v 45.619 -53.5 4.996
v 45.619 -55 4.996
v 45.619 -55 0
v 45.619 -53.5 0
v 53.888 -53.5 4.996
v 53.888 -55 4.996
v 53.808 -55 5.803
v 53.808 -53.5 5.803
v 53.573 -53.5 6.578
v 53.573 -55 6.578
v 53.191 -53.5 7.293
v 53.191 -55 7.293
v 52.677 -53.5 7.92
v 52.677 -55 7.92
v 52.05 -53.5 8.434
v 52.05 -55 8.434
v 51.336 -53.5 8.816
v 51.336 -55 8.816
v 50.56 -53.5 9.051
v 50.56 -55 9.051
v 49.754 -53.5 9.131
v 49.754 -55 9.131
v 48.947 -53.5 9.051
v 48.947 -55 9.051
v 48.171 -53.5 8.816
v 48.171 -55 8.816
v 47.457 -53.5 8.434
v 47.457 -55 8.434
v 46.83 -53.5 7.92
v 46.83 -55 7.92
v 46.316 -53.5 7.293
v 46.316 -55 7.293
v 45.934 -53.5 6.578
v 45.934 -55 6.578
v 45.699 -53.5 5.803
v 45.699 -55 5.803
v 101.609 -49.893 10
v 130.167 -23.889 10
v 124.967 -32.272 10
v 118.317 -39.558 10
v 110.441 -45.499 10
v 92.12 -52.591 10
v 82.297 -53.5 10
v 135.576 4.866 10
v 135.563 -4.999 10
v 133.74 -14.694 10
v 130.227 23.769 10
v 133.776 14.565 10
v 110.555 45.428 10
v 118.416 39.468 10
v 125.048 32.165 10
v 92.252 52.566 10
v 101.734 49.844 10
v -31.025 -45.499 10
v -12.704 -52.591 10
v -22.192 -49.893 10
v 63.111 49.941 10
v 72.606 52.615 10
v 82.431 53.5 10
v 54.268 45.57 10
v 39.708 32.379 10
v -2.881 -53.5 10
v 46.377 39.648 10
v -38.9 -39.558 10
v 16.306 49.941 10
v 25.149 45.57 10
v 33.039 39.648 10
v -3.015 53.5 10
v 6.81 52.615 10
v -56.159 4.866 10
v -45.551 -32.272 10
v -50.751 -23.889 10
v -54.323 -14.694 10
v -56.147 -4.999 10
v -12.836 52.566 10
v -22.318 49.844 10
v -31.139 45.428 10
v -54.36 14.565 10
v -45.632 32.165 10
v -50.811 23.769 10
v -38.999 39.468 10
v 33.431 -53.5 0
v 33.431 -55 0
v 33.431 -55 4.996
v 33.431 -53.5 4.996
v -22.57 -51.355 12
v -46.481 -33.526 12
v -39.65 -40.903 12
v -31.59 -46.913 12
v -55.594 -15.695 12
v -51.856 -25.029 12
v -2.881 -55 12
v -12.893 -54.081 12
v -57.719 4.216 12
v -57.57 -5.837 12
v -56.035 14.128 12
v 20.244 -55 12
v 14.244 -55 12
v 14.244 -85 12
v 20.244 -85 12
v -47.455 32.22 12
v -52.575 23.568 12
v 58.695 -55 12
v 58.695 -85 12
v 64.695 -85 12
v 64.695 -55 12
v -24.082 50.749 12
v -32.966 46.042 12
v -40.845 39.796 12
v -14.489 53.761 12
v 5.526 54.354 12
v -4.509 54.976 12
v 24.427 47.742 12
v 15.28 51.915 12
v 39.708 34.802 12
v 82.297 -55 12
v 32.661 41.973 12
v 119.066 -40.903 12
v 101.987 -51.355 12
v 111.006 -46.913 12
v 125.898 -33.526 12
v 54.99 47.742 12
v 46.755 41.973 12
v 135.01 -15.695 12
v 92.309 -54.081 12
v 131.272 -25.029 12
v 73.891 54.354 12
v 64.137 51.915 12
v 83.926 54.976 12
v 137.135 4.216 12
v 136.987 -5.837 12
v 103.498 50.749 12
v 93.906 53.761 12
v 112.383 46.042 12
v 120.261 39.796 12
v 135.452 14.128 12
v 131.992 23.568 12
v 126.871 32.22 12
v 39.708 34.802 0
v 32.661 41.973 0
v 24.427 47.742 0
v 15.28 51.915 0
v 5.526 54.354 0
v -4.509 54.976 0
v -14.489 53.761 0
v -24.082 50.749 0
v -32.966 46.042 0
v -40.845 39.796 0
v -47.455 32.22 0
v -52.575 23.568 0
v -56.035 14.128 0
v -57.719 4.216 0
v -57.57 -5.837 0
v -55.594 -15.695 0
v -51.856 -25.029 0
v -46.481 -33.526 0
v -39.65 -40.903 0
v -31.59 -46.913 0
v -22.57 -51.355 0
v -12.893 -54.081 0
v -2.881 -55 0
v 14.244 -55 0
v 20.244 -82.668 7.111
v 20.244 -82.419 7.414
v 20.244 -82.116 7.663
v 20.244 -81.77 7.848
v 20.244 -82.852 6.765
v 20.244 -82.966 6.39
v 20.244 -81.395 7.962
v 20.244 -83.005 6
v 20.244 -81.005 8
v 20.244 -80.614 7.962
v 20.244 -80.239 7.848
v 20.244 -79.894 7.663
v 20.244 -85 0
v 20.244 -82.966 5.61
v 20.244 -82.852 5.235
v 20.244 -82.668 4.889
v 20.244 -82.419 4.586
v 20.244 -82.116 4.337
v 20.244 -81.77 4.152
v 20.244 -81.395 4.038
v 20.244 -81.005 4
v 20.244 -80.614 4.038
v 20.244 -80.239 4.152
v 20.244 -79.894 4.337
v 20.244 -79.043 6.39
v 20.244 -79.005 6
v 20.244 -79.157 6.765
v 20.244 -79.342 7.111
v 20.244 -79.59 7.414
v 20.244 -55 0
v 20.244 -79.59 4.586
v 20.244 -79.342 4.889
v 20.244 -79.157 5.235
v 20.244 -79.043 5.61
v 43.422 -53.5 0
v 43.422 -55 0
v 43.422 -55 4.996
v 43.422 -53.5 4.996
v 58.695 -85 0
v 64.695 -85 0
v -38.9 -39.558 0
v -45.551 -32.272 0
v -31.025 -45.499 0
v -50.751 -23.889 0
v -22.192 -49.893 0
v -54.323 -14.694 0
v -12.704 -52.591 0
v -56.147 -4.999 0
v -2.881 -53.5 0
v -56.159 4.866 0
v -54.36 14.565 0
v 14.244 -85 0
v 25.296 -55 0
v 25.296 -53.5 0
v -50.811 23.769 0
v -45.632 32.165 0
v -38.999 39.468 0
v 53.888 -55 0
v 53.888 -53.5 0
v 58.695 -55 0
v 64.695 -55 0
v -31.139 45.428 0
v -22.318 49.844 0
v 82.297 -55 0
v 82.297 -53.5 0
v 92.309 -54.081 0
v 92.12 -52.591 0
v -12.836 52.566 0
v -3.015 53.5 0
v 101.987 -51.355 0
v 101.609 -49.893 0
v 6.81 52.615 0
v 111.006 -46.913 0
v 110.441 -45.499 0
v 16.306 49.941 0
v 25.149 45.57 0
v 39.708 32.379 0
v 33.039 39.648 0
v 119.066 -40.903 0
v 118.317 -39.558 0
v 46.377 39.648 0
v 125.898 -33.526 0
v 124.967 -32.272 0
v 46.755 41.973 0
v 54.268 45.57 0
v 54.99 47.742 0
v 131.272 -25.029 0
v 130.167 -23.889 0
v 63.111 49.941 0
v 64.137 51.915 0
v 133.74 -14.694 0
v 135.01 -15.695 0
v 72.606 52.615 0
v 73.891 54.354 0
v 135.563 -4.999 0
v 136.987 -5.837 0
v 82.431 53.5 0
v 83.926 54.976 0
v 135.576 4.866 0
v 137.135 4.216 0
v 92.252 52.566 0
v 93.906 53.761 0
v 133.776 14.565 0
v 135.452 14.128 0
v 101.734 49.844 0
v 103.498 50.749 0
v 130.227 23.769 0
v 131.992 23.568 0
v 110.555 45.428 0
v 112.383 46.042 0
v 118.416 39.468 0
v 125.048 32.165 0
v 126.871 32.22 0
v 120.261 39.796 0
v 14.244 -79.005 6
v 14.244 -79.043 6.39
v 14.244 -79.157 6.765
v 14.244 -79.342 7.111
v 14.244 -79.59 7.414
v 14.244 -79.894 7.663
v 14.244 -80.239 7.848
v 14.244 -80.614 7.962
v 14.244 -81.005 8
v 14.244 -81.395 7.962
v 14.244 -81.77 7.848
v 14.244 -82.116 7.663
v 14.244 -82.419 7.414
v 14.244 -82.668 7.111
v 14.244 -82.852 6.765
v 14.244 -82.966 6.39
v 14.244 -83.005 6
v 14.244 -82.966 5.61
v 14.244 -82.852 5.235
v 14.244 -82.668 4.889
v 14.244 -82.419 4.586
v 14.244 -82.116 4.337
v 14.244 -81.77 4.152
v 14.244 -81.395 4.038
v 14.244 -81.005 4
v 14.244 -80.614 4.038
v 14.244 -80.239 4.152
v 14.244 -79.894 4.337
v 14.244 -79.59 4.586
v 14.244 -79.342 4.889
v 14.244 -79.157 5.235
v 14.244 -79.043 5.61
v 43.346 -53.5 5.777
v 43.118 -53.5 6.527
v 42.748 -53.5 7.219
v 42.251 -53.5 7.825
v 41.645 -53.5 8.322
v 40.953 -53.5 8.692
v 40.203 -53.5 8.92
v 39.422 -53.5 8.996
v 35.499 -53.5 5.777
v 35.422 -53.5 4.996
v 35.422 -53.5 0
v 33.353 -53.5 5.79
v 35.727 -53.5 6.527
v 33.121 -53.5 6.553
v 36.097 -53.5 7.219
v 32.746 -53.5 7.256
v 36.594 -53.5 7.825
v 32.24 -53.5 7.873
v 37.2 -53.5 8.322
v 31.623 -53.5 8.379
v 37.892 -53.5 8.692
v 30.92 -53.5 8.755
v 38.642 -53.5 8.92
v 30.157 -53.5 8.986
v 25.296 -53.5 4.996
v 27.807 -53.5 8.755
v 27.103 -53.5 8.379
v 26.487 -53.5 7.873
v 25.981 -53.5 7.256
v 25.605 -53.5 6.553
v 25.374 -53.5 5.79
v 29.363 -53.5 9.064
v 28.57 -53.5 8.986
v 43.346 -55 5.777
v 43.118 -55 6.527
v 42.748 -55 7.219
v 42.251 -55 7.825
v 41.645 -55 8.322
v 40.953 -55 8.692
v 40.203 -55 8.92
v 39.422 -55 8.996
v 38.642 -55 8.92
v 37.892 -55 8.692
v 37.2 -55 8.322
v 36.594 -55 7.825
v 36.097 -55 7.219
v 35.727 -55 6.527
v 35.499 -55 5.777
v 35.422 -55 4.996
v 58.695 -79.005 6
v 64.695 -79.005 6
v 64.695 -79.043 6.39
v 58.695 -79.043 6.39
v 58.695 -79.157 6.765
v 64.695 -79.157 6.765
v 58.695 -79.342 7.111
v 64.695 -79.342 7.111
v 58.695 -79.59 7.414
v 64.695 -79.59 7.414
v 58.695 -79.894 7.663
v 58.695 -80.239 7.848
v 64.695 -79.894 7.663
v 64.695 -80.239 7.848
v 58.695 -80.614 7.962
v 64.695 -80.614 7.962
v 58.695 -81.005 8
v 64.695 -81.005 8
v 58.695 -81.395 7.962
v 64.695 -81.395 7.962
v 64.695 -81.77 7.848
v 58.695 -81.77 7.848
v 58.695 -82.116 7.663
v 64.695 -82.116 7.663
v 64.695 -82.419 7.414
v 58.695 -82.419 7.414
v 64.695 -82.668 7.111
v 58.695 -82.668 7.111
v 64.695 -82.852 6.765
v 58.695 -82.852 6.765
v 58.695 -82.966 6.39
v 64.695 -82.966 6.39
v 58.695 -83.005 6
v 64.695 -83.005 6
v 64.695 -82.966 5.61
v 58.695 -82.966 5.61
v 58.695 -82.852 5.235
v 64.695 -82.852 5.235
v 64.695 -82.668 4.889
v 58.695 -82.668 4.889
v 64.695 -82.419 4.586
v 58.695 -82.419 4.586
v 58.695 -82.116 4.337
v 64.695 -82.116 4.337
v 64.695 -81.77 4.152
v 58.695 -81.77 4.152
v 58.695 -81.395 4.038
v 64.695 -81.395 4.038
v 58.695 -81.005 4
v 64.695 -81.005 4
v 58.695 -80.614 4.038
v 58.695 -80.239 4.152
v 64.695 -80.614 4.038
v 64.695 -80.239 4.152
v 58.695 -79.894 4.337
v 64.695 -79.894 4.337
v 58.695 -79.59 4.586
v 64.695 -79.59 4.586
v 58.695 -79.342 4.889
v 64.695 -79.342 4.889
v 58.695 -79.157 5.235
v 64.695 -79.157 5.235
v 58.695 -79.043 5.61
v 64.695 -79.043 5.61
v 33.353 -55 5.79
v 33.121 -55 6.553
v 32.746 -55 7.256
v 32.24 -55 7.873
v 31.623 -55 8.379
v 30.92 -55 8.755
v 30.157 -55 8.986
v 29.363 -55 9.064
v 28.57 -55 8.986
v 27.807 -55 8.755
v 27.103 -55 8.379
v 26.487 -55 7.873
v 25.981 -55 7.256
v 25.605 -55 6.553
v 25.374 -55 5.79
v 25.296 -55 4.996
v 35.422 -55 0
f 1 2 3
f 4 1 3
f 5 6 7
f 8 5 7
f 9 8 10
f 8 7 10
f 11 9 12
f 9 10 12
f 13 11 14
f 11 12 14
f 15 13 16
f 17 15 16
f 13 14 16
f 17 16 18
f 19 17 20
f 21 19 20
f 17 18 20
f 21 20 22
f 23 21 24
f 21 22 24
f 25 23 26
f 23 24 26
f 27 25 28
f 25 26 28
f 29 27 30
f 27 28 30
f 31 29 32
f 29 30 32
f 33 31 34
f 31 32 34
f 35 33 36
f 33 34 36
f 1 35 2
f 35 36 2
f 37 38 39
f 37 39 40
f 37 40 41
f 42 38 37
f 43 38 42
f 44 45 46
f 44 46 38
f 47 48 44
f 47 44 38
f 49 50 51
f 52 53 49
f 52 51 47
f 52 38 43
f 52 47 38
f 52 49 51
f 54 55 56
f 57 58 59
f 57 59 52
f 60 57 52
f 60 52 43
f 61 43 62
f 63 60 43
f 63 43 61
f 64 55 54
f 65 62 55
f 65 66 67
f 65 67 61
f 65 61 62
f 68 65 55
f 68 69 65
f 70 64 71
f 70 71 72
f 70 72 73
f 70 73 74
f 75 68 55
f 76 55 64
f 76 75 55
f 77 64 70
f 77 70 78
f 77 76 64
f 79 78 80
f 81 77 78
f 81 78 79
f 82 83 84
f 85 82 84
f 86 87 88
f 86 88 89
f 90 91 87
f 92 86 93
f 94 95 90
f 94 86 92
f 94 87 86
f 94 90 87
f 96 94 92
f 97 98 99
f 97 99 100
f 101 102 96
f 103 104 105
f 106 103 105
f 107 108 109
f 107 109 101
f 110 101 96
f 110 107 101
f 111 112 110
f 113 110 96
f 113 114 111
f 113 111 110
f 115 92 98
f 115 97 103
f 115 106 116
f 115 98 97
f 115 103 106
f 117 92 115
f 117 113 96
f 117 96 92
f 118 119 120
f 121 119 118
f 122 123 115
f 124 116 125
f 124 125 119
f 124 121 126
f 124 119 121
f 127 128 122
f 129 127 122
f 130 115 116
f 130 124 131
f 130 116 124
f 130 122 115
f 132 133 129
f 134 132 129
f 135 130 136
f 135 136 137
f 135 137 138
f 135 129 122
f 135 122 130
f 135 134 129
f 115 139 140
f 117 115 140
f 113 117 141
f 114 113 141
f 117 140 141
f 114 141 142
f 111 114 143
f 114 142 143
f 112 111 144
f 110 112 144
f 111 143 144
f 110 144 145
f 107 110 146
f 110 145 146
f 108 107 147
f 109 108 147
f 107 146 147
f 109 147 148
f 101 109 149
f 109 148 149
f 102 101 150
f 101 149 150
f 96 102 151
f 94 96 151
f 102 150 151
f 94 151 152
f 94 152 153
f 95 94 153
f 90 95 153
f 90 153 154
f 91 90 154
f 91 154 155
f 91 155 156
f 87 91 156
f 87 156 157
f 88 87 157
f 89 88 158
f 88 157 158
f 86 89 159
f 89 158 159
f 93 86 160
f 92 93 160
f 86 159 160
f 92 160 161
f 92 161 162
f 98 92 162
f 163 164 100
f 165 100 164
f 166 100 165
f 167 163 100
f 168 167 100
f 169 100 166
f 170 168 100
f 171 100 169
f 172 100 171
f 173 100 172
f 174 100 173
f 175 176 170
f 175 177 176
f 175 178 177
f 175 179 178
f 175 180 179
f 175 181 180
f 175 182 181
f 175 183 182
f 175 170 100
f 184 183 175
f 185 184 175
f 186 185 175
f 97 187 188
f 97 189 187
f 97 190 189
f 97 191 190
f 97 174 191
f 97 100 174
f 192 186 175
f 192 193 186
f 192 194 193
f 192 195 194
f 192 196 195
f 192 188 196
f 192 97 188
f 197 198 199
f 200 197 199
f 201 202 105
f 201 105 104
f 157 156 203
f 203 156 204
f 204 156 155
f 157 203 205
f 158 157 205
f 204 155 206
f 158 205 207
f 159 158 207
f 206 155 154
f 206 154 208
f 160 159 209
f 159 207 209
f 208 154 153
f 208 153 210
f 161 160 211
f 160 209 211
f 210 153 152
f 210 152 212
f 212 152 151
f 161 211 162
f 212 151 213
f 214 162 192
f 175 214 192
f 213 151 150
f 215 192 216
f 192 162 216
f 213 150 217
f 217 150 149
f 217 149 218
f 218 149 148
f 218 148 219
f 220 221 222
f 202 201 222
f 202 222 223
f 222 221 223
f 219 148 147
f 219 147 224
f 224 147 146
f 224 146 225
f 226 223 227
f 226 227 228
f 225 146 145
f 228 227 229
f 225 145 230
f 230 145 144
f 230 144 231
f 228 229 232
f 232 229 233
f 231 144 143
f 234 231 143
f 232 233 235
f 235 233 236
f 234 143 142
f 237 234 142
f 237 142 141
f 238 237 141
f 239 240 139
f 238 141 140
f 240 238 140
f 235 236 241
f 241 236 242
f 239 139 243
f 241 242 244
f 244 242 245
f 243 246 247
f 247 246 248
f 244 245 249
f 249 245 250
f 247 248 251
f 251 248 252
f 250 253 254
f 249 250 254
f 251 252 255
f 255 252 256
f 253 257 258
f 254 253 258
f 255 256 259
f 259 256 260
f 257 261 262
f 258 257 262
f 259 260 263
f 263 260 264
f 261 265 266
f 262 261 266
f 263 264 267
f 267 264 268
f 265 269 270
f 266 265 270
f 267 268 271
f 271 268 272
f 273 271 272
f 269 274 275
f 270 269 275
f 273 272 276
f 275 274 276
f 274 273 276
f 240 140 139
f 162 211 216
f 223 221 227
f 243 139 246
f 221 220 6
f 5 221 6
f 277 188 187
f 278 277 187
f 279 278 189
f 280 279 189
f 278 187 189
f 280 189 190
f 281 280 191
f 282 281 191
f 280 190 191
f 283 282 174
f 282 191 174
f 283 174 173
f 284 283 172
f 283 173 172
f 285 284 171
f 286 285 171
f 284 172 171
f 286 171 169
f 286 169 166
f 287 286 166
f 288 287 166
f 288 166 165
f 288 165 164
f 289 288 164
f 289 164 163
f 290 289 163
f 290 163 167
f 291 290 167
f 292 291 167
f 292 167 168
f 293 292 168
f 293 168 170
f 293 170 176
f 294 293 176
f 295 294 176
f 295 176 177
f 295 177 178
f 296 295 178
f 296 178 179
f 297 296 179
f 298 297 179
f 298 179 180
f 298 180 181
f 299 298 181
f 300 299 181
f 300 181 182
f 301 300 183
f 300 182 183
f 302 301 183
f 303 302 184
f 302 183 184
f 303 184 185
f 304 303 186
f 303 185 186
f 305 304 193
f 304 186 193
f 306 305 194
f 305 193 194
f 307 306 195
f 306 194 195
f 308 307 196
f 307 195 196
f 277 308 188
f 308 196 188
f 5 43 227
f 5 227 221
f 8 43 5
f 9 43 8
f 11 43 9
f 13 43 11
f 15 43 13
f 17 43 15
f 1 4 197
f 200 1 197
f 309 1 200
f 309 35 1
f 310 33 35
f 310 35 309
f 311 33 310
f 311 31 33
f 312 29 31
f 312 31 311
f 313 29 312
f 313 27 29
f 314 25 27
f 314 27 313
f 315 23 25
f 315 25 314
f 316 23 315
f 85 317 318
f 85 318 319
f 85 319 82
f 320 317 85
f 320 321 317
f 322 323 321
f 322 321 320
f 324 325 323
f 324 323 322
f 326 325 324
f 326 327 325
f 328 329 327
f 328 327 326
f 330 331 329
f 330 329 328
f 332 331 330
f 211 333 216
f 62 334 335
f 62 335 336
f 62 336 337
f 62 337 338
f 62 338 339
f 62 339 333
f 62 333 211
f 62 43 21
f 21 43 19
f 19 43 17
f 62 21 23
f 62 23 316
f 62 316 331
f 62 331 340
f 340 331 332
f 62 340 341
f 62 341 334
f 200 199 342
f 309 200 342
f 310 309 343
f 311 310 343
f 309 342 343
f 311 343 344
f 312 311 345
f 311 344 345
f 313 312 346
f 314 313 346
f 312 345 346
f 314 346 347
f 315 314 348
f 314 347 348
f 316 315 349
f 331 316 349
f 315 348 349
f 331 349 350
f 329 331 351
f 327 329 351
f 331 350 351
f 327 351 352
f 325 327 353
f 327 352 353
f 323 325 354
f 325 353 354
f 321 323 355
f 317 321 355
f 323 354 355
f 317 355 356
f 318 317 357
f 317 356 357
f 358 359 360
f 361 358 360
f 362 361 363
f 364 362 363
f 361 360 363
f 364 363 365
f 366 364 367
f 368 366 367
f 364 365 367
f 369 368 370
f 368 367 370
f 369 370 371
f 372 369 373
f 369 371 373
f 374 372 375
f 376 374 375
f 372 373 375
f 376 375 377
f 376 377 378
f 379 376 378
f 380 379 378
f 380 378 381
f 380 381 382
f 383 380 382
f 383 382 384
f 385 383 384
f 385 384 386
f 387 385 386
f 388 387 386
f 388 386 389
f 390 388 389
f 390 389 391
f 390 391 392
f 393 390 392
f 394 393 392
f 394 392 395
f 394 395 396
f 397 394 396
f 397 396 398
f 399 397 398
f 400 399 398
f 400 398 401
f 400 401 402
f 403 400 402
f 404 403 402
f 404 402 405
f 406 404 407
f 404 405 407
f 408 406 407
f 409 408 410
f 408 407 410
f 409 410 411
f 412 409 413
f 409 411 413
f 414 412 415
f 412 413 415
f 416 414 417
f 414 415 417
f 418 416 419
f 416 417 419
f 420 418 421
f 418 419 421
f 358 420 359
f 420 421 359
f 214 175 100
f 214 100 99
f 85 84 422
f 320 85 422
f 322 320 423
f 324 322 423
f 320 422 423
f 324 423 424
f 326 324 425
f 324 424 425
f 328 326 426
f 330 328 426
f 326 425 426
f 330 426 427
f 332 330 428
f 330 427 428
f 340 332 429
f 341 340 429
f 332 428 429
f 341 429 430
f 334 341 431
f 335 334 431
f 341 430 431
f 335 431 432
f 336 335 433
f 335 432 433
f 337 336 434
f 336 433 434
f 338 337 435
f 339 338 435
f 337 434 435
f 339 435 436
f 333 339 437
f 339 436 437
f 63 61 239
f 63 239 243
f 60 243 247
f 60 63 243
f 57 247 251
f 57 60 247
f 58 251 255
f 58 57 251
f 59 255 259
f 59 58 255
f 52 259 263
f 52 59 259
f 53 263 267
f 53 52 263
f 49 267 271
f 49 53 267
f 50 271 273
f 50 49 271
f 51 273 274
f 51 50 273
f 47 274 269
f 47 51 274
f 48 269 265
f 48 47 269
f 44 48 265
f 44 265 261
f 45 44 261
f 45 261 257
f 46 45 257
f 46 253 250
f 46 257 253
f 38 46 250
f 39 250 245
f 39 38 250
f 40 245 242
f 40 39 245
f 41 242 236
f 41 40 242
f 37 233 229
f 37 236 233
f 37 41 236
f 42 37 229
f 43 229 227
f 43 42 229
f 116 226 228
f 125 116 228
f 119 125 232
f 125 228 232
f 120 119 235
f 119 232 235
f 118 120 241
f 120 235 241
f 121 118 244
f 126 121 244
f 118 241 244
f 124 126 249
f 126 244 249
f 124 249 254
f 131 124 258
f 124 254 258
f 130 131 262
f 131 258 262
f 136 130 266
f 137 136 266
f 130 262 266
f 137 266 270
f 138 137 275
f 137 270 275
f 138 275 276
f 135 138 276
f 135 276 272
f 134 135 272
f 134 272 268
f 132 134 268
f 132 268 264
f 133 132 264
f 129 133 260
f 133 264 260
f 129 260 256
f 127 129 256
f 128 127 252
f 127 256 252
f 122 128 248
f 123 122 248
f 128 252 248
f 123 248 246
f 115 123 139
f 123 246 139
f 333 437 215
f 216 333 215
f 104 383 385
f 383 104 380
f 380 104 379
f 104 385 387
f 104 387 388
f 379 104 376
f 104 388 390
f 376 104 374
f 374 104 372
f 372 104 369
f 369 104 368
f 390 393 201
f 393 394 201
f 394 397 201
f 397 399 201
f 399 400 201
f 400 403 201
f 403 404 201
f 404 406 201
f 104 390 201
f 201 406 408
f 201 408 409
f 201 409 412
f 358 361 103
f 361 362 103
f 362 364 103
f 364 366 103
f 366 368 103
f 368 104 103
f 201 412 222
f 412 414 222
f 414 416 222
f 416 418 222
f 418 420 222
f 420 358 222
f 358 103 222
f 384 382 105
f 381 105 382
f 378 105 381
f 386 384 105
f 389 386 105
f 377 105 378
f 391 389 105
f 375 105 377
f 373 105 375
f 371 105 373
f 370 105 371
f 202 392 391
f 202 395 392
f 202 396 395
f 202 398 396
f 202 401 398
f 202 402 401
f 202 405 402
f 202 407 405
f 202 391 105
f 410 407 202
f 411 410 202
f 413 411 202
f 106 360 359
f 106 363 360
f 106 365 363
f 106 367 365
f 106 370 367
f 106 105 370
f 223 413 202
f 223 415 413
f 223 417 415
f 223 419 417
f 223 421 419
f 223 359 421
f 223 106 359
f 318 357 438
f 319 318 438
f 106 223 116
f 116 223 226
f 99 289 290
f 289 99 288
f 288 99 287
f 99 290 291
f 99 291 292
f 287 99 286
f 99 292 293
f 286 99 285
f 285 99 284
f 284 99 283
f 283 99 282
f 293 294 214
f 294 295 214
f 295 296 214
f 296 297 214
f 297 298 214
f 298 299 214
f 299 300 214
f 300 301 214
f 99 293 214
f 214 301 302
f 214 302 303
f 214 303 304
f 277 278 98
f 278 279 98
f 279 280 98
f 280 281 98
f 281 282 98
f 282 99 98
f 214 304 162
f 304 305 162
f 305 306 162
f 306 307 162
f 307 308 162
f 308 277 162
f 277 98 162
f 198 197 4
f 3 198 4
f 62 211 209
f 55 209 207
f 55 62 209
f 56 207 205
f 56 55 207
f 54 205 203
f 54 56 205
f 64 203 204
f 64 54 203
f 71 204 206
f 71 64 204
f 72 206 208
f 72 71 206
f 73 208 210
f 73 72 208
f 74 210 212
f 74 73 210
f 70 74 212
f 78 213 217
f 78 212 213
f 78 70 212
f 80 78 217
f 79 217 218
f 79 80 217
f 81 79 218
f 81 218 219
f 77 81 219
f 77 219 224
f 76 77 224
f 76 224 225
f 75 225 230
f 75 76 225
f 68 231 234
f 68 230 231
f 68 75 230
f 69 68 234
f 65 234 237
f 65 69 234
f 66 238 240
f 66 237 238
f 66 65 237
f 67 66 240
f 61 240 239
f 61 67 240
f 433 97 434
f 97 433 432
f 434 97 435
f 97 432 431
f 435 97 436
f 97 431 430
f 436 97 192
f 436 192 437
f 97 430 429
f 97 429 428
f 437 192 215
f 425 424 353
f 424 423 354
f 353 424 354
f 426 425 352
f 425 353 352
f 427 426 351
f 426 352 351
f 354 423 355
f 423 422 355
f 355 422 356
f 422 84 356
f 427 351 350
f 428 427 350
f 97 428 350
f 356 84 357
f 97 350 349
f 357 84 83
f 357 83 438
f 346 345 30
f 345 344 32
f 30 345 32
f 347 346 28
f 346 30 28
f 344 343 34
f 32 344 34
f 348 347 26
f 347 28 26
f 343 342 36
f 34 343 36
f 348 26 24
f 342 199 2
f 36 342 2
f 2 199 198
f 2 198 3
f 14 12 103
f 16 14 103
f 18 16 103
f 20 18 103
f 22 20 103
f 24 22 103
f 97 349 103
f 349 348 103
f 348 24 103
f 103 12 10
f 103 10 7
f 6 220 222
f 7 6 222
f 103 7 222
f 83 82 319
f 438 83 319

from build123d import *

# Parameters (mm, degrees)
Y_KSEKLIK_EKSTR_ZYON1_DEPTH = 12
KES_EKSTR_ZYON1_DEPTH       = 10
KES_EKSTR_ZYON4_DEPTH       = 20
IZIM4_W                     = 6
IZIM4_H                     = 12
Y_KSEKLIK_EKSTR_ZYON2_DEPTH = 30
IZIM5_R                     = 2
KES_EKSTR_ZYON5_DEPTH       = 60


with BuildPart() as part:
    # Çizim1 → Yükseklik-Ekstrüzyon1 (new body)
    with BuildSketch(Plane.XY):
        with BuildLine():
            Line((-2.88077248, -55), (82.297274127, -55))
            ThreePointArc((82.297274127, -55), (131.991875204, 23.567915135), (39.708250823, 34.801940953))
            ThreePointArc((39.708250823, 34.801940953), (-52.575373557, 23.567915135), (-2.88077248, -55))
        make_face()
    extrude(amount=Y_KSEKLIK_EKSTR_ZYON1_DEPTH)

    # Çizim2 → Kes-Ekstrüzyon1 (cut, symmetric)
    with BuildSketch(Plane.XY):
        with BuildLine():
            Line((82.297274127, -53.5), (-2.88077248, -53.5))
            ThreePointArc((-2.88077248, -53.5), (-50.81065631, 23.769228763), (39.708250823, 32.379393047))
            ThreePointArc((39.708250823, 32.379393047), (130.227157957, 23.769228763), (82.297274127, -53.5))
        make_face()
    extrude(amount=KES_EKSTR_ZYON1_DEPTH, both=True, mode=Mode.SUBTRACT)

    # Çizim3 → Kes-Ekstrüzyon4 (cut)
    with BuildSketch(Plane.XZ.offset(55)):
        with BuildLine():
            Line((25.295548254, 4.99642351), (25.295548254, 0))
            Line((25.295548254, 0), (33.431042786, 0))
            Line((33.431042786, 0), (33.431042786, 4.99642351))
            ThreePointArc((33.431042786, 4.99642351), (29.36329552, 9.064170776), (25.295548254, 4.99642351))
        make_face()
        with BuildLine():
            Line((35.422473694, 4.99642351), (35.422473694, 0))
            Line((35.422473694, 0), (43.422473694, 0))
            Line((43.422473694, 0), (43.422473694, 4.99642351))
            ThreePointArc((43.422473694, 4.99642351), (39.422473694, 8.99642351), (35.422473694, 4.99642351))
        make_face()
        with BuildLine():
            Line((45.619413975, 4.99642351), (45.619413975, 0))
            Line((45.619413975, 0), (53.887629124, 0))
            Line((53.887629124, 0), (53.887629124, 4.99642351))
            ThreePointArc((53.887629124, 4.99642351), (49.753521549, 9.130531084), (45.619413975, 4.99642351))
        make_face()
    extrude(amount=-KES_EKSTR_ZYON4_DEPTH, mode=Mode.SUBTRACT)

    # Çizim4 → Yükseklik-Ekstrüzyon2 (add)
    with BuildSketch(Plane(origin=(0, -55, 0), x_dir=(-1, 0, 0), z_dir=(0, -1, 0))):
        with Locations((-17.243778266, -6)):
            Rectangle(IZIM4_W, IZIM4_H)
        with Locations((-61.695384492, -6)):
            Rectangle(IZIM4_W, IZIM4_H)
    extrude(amount=Y_KSEKLIK_EKSTR_ZYON2_DEPTH)

    # Çizim5 → Kes-Ekstrüzyon5 (cut)
    with BuildSketch(Plane(origin=(64.695384492, 0, 0), x_dir=(0, 0, -1), z_dir=(1, 0, 0))):
        with Locations(Location((-6, -81.004647187, 0), (0, 0, 90))):
            Circle(IZIM5_R)
    extrude(amount=-KES_EKSTR_ZYON5_DEPTH, mode=Mode.SUBTRACT)


solid = part.part
